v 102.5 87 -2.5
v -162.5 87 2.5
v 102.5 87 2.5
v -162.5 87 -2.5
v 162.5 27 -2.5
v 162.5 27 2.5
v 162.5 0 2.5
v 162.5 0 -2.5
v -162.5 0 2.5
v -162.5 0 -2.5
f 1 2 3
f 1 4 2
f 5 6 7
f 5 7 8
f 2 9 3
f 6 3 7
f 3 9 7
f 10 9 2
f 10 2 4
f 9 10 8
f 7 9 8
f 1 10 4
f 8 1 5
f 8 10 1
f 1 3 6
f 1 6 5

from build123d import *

# Parameters (mm, degrees)
SKETCH1_W           = 325
SKETCH1_H           = 5
BOSS_EXTRUDE1_DEPTH = 87
CHAMFER1_SIZE       = 60


with BuildPart() as part:
    # Sketch1 → Boss-Extrude1 (new body)
    with BuildSketch(Plane(origin=(0, 0, 0), x_dir=(1, 0, 0), z_dir=(0, 1, 0))):
        Rectangle(SKETCH1_W, SKETCH1_H)
    extrude(amount=BOSS_EXTRUDE1_DEPTH)

    # Chamfer1
    chamfer1_edges = [part.edges().sort_by_distance(p)[0] for p in [
        (162.5, 87, 0),
    ]]
    chamfer(chamfer1_edges, length=CHAMFER1_SIZE)


solid = part.part
